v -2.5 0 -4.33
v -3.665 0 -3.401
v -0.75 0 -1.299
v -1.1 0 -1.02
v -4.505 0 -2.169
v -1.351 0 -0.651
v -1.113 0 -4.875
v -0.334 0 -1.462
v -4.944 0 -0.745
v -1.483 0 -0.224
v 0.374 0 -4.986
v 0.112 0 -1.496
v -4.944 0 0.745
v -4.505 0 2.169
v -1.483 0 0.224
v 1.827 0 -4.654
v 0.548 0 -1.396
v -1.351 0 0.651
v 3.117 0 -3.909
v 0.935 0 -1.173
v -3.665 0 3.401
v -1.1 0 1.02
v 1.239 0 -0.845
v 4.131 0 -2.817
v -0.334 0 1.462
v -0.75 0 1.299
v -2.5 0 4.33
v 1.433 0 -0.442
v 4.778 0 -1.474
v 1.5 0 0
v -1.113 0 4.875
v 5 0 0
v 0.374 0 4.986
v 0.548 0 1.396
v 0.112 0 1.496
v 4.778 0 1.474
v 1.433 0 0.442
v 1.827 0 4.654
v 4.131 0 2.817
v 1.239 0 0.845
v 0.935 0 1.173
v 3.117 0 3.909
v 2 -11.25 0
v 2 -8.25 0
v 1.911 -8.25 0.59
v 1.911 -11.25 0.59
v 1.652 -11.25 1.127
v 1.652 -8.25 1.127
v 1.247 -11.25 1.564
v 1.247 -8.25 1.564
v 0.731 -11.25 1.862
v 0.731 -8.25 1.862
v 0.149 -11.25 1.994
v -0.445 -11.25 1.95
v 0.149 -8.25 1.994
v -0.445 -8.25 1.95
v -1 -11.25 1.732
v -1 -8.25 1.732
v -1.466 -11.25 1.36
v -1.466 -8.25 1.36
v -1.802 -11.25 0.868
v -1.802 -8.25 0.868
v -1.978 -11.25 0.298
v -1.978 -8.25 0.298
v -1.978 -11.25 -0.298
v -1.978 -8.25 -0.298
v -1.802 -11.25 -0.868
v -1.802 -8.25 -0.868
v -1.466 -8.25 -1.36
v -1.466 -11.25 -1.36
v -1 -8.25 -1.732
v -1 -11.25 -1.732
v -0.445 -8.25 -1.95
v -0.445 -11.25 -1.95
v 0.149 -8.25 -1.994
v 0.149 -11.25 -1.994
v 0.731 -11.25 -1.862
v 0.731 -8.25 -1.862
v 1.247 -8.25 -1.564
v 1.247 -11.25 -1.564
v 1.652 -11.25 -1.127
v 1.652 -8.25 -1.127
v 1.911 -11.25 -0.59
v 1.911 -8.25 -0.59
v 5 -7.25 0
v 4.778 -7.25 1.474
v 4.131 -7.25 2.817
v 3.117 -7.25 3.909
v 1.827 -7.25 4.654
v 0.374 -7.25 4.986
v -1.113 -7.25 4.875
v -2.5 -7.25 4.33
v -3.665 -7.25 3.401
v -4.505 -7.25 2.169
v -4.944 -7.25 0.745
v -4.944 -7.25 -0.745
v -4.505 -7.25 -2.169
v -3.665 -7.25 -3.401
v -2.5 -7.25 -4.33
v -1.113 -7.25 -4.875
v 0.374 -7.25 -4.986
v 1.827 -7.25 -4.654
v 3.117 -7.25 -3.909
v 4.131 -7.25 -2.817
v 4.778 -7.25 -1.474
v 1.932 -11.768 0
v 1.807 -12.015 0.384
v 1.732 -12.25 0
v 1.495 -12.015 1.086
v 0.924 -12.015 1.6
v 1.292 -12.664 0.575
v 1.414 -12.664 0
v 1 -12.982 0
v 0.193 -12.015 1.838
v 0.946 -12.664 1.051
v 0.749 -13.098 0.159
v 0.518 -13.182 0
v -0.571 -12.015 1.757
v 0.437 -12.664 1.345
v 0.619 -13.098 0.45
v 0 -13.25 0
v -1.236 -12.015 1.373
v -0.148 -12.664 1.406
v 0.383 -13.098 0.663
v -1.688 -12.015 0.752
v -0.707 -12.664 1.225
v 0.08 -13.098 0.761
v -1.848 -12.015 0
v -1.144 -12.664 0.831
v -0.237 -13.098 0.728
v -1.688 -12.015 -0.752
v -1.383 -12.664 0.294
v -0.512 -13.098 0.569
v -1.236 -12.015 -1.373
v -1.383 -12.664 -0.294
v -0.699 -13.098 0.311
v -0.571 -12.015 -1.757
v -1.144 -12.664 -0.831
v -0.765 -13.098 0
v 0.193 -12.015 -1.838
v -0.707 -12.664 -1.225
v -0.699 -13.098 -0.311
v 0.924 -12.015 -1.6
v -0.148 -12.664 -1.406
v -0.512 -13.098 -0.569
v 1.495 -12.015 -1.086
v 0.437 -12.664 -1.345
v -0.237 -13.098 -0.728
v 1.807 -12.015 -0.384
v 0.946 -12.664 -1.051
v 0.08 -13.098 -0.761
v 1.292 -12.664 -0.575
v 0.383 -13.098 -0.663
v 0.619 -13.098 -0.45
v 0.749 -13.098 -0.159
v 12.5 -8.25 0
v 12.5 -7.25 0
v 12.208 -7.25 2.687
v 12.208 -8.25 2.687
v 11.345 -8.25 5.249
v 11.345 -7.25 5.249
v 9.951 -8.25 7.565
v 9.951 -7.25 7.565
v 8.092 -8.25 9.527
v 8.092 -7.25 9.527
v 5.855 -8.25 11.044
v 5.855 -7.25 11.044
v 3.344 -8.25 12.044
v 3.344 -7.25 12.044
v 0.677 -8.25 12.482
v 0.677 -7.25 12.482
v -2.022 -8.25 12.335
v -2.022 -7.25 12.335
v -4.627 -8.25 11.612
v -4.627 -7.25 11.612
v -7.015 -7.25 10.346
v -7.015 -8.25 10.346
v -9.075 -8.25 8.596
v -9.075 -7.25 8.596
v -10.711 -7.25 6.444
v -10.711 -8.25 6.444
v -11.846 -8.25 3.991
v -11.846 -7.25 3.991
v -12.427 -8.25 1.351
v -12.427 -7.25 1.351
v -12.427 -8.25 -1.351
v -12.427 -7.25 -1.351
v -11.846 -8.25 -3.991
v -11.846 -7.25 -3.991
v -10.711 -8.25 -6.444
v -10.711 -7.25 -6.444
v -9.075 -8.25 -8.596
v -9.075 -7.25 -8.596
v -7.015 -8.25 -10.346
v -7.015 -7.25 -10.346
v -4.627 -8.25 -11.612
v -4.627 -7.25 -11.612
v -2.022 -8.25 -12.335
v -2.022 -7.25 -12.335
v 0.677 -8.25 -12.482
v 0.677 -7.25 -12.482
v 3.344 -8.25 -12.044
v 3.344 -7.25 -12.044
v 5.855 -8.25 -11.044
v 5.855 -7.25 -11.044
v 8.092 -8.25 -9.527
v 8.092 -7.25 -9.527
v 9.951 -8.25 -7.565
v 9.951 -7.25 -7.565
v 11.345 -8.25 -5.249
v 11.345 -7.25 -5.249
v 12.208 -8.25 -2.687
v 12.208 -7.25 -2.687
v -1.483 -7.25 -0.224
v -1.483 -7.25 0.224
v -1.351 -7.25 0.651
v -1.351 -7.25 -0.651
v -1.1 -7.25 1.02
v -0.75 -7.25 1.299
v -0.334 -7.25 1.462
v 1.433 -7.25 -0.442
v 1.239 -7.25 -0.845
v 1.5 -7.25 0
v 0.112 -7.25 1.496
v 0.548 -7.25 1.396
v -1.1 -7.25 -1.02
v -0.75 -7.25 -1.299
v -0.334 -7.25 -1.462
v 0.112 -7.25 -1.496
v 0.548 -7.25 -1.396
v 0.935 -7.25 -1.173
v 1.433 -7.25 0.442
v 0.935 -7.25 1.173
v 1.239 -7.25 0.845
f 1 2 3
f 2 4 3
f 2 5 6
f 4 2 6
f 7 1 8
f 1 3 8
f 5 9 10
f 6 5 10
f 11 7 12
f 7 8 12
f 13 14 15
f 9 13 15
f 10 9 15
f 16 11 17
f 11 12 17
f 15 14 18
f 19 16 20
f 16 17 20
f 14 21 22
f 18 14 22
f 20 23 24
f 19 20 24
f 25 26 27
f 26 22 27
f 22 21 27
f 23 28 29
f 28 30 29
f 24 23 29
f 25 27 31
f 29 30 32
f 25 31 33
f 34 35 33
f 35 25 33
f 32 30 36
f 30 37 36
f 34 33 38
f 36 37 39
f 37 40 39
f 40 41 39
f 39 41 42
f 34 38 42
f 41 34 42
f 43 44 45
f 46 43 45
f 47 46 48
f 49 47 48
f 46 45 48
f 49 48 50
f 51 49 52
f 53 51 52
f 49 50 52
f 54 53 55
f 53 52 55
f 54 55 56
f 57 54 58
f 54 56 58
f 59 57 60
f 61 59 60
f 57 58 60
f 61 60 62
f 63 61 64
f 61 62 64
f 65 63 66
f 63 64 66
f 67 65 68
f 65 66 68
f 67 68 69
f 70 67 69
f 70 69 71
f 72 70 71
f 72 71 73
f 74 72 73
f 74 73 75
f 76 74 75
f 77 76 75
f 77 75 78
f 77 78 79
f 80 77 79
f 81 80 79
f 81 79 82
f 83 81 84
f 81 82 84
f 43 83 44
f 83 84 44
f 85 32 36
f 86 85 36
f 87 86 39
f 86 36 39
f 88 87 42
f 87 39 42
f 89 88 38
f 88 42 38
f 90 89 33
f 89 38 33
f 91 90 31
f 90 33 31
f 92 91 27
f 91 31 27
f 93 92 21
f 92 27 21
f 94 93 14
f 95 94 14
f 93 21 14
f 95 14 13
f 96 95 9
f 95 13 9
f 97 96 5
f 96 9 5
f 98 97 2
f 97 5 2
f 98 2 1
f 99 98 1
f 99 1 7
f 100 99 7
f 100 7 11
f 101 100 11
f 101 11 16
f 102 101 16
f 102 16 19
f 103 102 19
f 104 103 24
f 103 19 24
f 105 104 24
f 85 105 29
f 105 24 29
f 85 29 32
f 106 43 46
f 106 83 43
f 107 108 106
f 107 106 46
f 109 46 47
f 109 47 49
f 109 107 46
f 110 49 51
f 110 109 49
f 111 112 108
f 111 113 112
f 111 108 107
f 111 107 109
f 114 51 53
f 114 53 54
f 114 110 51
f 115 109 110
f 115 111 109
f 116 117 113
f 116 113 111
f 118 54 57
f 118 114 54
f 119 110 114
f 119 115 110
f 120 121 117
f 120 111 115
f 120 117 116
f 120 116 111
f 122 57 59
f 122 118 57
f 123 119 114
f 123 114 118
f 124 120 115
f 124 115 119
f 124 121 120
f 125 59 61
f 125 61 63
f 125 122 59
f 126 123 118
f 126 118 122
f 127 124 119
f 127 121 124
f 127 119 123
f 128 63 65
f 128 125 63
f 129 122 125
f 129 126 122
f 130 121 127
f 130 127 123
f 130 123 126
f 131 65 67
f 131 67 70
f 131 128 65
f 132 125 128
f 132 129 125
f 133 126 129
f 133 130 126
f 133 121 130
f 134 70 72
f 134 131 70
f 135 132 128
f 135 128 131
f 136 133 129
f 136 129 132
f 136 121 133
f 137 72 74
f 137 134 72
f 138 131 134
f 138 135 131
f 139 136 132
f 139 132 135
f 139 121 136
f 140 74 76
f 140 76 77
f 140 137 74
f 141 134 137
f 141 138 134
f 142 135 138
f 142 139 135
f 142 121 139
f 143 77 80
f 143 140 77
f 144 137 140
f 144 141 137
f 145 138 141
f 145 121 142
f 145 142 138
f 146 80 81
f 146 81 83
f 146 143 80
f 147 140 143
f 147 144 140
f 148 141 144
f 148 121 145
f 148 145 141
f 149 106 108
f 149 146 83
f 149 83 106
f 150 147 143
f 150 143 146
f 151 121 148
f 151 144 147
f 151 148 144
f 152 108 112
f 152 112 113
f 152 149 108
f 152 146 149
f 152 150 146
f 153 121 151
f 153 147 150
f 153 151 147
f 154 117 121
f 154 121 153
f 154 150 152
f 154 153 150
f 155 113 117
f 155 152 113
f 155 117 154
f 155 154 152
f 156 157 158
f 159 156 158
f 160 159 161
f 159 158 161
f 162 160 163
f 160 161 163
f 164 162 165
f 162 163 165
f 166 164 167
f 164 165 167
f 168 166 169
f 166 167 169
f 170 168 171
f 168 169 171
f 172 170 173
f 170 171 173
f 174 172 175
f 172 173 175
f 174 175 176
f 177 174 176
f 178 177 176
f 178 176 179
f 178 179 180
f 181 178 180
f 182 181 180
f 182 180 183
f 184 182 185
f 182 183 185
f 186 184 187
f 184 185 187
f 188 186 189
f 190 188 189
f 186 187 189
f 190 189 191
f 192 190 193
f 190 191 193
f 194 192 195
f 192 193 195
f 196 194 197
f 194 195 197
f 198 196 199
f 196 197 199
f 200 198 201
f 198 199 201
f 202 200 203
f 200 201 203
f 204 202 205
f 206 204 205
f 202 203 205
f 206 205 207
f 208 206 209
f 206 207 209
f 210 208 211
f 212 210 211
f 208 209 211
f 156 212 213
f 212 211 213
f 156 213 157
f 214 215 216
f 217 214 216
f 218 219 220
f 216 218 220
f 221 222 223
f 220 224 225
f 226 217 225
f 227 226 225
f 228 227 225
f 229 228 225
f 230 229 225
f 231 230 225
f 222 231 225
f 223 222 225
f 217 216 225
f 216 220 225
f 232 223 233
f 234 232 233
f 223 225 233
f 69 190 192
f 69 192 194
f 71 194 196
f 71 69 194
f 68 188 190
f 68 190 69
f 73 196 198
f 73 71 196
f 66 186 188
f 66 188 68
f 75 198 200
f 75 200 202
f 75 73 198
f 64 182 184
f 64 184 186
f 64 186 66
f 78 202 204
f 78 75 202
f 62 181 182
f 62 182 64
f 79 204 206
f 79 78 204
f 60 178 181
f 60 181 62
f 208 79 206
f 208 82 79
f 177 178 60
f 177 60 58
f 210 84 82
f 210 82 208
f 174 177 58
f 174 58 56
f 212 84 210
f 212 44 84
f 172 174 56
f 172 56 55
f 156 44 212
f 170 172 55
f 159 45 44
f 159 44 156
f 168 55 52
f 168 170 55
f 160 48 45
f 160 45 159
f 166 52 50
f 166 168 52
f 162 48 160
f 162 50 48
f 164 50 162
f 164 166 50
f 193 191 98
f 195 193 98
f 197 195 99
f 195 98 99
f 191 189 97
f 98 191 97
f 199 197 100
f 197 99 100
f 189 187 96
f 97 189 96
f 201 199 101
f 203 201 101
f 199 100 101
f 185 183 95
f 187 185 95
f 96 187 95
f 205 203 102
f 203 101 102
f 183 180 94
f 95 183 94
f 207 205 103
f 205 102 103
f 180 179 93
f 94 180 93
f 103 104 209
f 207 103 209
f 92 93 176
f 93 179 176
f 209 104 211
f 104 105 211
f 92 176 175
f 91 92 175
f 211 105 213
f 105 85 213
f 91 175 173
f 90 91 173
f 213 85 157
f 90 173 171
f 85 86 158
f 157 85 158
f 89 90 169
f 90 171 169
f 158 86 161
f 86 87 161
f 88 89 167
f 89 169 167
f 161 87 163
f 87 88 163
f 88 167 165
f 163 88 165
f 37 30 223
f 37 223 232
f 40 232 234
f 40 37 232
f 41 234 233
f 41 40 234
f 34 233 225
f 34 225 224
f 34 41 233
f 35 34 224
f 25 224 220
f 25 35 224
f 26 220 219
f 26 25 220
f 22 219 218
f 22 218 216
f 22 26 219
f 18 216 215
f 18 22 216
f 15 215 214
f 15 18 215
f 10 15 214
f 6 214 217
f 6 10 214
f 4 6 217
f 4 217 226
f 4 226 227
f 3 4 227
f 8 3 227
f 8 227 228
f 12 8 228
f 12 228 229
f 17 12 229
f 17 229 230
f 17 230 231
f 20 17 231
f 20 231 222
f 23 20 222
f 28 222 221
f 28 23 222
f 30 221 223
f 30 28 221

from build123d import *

# Parameters (mm, degrees)
F0_R     = 5
F0_R_2   = 1.5
F1_DEPTH = 7.25
F2_R     = 12.5
F3_DEPTH = 1
F4_R     = 2
F5_DEPTH = 5
F6_R     = 2


with BuildPart() as f1:
    # F0 (on Front) → F1 (new body)
    with BuildSketch(Plane.XZ):
        Circle(F0_R)
        Circle(F0_R_2, mode=Mode.SUBTRACT)
    extrude(amount=F1_DEPTH)

    # F2 (on face) → F3 (join)
    with BuildSketch(Plane.XZ.offset(7.25)):
        Circle(F2_R)
    extrude(amount=F3_DEPTH)

    # F4 (on face) → F5 (join)
    with BuildSketch(Plane.XZ.offset(8.25)):
        Circle(F4_R)
    extrude(amount=F5_DEPTH)

    # F6
    f6_edges = [f1.edges().sort_by_distance(p)[0] for p in [
        (-2, -13.25, 0),
    ]]
    fillet(f6_edges, radius=F6_R)


solid = f1.part
